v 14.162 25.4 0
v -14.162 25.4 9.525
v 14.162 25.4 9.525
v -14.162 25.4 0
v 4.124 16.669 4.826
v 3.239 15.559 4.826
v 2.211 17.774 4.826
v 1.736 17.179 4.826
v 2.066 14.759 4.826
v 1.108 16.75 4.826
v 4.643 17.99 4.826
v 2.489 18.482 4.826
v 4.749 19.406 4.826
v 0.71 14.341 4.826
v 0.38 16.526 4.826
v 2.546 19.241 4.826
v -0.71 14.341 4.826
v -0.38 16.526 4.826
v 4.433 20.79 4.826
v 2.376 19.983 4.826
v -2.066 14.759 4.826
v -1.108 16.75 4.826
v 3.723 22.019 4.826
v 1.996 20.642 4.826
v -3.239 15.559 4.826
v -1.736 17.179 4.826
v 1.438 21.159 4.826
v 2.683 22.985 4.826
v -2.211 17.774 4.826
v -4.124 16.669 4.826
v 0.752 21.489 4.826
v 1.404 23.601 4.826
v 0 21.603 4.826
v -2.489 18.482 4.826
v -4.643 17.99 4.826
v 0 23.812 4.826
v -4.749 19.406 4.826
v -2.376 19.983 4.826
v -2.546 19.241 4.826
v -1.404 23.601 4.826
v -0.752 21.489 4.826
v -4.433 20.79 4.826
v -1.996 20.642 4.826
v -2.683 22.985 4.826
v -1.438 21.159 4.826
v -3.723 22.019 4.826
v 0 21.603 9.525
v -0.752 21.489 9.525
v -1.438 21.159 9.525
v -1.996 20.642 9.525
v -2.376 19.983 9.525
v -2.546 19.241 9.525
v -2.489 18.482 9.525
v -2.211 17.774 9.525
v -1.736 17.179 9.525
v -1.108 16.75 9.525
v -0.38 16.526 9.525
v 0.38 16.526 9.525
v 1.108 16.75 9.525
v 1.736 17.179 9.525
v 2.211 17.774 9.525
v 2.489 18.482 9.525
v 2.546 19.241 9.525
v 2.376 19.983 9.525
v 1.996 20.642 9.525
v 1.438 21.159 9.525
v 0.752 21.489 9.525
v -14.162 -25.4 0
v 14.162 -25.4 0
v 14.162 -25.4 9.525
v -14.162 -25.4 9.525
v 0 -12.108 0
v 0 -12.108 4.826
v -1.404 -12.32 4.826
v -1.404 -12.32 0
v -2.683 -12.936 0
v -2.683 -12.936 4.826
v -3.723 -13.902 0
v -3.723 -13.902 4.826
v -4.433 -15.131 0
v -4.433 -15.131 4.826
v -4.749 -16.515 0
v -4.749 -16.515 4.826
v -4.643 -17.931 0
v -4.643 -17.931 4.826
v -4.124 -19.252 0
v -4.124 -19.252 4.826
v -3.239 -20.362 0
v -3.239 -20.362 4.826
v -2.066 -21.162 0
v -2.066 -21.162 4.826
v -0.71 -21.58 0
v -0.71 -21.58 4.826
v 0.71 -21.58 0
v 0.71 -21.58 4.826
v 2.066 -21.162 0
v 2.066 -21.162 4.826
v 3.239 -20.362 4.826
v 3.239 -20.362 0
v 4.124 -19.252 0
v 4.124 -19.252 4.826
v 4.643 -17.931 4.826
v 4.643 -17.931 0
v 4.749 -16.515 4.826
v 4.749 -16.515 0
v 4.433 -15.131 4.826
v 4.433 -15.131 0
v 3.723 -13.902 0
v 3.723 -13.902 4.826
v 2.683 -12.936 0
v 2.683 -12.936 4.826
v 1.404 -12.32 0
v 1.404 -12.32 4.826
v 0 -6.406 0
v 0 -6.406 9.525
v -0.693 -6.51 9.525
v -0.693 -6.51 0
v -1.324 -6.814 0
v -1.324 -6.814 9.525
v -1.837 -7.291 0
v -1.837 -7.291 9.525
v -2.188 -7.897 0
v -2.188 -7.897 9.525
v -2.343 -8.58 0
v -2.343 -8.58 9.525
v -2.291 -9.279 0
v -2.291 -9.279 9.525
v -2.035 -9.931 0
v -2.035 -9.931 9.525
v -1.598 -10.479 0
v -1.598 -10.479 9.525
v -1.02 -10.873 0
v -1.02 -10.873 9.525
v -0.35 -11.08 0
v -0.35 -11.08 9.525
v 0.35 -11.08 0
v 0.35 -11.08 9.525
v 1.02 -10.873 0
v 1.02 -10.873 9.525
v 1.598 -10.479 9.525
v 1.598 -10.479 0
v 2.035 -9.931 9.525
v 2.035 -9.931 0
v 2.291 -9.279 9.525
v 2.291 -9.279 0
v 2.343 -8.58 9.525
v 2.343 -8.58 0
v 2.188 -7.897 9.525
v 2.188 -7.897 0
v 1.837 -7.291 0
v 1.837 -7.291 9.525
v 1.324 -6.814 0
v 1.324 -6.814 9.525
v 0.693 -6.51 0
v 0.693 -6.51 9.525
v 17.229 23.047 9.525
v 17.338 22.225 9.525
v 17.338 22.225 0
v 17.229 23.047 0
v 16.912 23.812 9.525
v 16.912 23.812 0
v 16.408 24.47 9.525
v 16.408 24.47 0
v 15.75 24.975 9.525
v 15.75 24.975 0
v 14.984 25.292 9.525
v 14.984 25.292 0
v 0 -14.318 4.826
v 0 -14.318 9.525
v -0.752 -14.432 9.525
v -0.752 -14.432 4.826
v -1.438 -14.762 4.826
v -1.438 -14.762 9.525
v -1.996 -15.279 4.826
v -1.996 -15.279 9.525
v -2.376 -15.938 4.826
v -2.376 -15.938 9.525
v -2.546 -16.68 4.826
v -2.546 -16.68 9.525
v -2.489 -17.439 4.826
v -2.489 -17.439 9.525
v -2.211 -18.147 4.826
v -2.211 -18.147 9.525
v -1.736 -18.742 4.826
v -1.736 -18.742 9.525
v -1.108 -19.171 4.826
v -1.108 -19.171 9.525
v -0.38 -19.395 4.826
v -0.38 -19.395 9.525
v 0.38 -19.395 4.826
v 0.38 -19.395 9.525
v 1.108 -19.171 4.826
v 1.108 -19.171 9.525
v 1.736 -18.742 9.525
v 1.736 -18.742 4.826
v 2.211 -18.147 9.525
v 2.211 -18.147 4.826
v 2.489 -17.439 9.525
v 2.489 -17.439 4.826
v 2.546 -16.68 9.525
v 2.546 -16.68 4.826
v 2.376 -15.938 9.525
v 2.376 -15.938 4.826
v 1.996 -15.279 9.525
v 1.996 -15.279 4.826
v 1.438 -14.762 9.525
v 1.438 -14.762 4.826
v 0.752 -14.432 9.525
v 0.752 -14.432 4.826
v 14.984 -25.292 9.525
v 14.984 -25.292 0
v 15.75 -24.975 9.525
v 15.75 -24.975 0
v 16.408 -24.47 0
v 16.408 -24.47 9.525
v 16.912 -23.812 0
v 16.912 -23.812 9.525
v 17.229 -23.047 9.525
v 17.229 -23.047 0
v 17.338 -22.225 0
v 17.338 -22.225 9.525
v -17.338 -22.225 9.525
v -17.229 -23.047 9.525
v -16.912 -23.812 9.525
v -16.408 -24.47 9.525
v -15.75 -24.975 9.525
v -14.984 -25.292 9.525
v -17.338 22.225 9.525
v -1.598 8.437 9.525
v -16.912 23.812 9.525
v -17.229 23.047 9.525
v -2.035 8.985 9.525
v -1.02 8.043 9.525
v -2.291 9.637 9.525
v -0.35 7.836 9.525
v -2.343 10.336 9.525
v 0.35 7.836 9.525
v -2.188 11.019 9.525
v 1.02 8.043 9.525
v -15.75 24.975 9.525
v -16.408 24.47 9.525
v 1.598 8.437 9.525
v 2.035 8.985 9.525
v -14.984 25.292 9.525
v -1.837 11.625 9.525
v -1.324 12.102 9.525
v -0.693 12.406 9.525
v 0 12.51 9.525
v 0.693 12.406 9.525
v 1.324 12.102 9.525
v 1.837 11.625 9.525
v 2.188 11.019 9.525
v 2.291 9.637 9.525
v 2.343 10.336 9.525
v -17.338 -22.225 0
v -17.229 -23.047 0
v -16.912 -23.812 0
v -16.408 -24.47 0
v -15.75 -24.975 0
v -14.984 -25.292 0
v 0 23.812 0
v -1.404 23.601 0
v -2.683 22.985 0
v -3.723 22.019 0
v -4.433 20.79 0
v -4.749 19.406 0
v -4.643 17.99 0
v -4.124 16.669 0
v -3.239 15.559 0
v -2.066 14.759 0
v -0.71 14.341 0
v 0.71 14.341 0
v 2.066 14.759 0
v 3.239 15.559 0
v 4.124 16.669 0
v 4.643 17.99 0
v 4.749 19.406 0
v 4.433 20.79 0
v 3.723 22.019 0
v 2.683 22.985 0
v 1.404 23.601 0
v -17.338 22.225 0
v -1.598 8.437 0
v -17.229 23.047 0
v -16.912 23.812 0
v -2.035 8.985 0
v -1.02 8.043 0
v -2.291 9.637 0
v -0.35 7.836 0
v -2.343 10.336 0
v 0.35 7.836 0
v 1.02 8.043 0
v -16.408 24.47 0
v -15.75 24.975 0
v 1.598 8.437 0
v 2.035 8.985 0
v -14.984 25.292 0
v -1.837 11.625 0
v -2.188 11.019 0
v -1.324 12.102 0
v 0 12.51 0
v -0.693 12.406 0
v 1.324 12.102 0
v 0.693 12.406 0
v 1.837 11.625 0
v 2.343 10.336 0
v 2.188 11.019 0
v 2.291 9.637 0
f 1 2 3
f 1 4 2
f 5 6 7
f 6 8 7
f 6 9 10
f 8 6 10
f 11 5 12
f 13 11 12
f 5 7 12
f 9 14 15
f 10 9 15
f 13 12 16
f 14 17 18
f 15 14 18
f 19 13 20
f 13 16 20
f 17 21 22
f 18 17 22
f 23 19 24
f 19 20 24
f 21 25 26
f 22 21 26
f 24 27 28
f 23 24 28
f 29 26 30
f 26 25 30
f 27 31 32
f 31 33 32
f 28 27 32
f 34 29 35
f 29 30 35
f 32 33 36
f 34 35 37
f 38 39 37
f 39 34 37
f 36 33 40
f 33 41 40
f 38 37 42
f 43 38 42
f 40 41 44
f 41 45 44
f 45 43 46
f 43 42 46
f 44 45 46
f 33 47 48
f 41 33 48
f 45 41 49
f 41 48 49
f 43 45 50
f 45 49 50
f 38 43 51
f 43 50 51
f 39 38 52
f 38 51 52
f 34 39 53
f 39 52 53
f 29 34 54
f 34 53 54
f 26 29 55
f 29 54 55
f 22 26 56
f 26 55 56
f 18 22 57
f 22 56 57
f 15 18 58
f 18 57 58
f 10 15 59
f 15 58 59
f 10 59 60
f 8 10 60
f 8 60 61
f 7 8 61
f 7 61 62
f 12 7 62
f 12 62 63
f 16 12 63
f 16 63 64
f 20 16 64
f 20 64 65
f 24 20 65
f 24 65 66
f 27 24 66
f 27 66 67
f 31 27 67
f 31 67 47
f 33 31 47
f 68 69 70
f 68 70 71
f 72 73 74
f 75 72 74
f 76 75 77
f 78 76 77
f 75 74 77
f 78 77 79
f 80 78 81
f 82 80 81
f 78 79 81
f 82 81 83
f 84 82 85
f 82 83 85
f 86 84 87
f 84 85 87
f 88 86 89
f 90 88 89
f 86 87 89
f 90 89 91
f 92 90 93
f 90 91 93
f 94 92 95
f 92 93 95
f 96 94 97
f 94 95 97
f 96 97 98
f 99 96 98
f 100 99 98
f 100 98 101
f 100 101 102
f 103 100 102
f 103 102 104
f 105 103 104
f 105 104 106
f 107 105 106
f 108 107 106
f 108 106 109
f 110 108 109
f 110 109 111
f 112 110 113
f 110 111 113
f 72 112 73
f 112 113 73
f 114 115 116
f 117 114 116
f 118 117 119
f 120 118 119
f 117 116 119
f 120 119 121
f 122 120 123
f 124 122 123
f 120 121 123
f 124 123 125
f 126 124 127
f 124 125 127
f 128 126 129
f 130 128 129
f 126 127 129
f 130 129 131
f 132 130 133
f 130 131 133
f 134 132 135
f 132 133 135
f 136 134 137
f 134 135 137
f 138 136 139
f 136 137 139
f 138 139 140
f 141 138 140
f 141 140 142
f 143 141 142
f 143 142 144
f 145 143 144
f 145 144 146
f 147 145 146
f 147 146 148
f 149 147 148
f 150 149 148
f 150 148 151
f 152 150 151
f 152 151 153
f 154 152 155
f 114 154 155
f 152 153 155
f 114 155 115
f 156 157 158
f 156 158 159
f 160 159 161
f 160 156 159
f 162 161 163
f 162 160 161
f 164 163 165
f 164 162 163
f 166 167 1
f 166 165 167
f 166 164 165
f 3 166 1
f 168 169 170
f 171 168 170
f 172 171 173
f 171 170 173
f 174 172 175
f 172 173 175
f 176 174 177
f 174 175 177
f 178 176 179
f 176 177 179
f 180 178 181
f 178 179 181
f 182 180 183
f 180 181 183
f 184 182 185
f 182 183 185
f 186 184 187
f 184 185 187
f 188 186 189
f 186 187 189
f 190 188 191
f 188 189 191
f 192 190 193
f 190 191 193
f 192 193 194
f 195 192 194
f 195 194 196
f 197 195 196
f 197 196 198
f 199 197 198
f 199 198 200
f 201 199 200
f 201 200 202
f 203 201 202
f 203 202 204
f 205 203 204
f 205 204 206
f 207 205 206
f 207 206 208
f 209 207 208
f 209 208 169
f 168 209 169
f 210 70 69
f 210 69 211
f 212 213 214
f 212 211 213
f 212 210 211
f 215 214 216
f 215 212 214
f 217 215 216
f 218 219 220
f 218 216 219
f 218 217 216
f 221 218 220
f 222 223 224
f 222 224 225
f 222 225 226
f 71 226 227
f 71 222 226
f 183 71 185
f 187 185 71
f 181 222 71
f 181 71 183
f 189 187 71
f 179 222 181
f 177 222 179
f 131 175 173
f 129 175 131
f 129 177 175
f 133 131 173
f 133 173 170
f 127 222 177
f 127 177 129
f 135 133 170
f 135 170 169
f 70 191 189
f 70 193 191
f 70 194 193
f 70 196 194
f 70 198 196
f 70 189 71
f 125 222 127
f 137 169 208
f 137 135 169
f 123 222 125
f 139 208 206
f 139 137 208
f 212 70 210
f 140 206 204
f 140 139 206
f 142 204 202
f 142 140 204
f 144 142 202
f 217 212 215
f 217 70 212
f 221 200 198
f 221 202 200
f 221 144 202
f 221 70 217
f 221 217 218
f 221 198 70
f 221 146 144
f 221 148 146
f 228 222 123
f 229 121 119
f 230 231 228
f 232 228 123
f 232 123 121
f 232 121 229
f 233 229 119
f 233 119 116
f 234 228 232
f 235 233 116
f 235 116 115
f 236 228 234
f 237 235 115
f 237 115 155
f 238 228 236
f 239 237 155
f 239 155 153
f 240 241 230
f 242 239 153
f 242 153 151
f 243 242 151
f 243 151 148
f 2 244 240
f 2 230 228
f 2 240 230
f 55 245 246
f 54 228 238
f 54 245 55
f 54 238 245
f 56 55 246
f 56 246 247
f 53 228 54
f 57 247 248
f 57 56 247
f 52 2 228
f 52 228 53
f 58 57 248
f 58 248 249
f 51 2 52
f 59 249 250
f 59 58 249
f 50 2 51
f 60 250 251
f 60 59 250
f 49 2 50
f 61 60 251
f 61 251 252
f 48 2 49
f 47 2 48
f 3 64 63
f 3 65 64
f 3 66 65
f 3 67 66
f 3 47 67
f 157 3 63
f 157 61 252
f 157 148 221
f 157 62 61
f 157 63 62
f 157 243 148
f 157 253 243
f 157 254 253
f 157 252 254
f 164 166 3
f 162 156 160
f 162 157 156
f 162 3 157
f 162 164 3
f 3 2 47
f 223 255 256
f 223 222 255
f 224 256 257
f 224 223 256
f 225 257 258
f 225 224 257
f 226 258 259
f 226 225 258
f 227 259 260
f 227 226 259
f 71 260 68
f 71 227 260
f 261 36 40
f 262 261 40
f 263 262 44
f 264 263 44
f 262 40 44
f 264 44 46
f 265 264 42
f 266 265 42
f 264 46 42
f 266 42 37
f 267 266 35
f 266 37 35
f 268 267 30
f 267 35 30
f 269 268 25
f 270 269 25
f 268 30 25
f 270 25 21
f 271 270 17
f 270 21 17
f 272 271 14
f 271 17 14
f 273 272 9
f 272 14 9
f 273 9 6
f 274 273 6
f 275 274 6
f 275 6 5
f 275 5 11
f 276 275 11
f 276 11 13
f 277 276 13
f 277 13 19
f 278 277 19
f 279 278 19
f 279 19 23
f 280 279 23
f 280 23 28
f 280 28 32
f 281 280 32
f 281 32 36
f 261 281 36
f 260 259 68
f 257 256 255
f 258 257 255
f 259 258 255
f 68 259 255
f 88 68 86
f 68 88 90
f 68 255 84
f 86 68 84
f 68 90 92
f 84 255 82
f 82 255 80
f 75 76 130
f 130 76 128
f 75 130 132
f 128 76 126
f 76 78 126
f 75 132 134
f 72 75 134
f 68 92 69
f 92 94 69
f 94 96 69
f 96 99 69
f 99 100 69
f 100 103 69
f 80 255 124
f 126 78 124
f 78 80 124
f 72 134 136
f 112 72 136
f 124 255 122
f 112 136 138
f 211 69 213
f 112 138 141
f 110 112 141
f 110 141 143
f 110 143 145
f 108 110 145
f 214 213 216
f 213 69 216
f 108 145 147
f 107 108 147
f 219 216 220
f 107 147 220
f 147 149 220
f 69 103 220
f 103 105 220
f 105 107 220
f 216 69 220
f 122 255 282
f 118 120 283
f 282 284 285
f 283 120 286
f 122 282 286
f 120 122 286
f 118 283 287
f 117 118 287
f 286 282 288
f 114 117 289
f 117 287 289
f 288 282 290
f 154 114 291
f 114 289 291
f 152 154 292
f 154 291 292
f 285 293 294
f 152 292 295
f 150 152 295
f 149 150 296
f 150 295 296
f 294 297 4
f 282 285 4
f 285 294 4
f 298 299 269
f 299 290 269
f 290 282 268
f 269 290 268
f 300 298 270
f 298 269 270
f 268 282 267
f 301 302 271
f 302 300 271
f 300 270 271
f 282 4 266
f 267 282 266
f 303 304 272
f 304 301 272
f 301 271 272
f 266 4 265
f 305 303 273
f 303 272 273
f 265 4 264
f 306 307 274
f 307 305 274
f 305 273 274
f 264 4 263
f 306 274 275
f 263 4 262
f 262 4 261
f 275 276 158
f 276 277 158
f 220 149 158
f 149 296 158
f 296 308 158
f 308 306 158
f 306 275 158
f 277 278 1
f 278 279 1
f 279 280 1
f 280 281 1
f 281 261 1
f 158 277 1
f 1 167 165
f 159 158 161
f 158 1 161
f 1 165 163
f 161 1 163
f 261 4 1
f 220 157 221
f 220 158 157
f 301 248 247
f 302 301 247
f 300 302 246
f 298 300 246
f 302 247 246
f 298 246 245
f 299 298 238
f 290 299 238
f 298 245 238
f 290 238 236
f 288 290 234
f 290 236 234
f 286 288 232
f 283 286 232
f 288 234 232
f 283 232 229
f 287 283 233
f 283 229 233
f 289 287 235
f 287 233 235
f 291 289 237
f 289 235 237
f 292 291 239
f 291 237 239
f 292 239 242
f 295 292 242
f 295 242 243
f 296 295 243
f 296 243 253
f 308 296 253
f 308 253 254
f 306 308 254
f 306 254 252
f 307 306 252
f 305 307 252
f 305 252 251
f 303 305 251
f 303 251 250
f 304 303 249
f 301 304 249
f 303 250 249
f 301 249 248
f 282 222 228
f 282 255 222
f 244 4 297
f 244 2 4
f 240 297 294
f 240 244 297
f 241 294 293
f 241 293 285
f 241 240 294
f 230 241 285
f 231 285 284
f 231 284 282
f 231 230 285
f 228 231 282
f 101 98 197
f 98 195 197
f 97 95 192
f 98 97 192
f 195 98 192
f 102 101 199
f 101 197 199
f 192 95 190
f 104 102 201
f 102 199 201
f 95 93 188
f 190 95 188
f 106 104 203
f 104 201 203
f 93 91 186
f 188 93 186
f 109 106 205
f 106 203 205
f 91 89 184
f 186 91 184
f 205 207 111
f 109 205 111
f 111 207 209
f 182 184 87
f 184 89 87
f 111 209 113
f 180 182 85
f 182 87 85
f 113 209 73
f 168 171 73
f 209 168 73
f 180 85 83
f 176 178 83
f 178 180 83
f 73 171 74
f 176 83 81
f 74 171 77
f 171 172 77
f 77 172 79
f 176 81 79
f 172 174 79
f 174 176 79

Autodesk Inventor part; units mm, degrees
ref_plane "YZ Plane" through (0, 0, 0) normal (1, 0, 0) x (0, 1, 0)
ref_plane "XZ Plane" through (0, 0, 0) normal (0, 1, 0) x (-1, 0, 0)
ref_plane "XY Plane" through (0, 0, 0) normal (0, 0, 1) x (1, 0, 0)
sketch "Sketch1" plane through (0, 0, 0) normal (0, 0, 1) x (1, 0, 0)
  line L0 (-17.3375, 25.4) -> (17.3375, 25.4)
  line L1 (17.3375, 25.4) -> (17.3375, -25.4)
  line L2 (17.3375, -25.4) -> (-17.3375, -25.4)
  line L3 (-17.3375, -25.4) -> (-17.3375, 25.4)
  line L4 (-17.3375, 25.4) -> (17.3375, -25.4) construction
  line L5 (17.3375, 25.4) -> (-17.3375, -25.4) construction
  line L6 (0, 19.05) -> (0, -16.871) construction
  line L7 (0, 10.16) -> (0, -8.756) construction
  point P0 (0, 0)
  point P1 (0, 0.702)
  point P2 (0, 25.4)
  point P3 (0, 1.0895)
  dimension "d0" = 34.675
  dimension "d1" = 50.8
  dimension "d3" = 18.916
  dimension "d4" = 15.24
  dimension "d23" = 35.921
  dimension "d26" = 6.35
extrude "Extrusion1" add sketch "Sketch1" along normal blind 9.525
hole "Hole1" at (0, 19.05, 0) at (0, -16.871, 0) direction (0, 0, 1) diameter 5.1054 end through all counterbore diameter 9.525 counterbore depth 4.826 clearance for "Socket Head Cap Screw" size "#10" standard "Ansi Unified Screw Threads"
hole "Hole2" at (0, -8.756, 0) at (0, 10.16, 0) direction (0, 0, 1) diameter 4.7 end through all
fillet "Fillet1" radius 3.175 4 edges at (17.3375, 25.4, 4.7625) (-17.3375, 25.4, 4.7625) (-17.3375, -25.4, 4.7625) (17.3375, -25.4, 4.7625)
properties part number "anderson battery connectorAnderson adapter" material "ABS Plastic"
